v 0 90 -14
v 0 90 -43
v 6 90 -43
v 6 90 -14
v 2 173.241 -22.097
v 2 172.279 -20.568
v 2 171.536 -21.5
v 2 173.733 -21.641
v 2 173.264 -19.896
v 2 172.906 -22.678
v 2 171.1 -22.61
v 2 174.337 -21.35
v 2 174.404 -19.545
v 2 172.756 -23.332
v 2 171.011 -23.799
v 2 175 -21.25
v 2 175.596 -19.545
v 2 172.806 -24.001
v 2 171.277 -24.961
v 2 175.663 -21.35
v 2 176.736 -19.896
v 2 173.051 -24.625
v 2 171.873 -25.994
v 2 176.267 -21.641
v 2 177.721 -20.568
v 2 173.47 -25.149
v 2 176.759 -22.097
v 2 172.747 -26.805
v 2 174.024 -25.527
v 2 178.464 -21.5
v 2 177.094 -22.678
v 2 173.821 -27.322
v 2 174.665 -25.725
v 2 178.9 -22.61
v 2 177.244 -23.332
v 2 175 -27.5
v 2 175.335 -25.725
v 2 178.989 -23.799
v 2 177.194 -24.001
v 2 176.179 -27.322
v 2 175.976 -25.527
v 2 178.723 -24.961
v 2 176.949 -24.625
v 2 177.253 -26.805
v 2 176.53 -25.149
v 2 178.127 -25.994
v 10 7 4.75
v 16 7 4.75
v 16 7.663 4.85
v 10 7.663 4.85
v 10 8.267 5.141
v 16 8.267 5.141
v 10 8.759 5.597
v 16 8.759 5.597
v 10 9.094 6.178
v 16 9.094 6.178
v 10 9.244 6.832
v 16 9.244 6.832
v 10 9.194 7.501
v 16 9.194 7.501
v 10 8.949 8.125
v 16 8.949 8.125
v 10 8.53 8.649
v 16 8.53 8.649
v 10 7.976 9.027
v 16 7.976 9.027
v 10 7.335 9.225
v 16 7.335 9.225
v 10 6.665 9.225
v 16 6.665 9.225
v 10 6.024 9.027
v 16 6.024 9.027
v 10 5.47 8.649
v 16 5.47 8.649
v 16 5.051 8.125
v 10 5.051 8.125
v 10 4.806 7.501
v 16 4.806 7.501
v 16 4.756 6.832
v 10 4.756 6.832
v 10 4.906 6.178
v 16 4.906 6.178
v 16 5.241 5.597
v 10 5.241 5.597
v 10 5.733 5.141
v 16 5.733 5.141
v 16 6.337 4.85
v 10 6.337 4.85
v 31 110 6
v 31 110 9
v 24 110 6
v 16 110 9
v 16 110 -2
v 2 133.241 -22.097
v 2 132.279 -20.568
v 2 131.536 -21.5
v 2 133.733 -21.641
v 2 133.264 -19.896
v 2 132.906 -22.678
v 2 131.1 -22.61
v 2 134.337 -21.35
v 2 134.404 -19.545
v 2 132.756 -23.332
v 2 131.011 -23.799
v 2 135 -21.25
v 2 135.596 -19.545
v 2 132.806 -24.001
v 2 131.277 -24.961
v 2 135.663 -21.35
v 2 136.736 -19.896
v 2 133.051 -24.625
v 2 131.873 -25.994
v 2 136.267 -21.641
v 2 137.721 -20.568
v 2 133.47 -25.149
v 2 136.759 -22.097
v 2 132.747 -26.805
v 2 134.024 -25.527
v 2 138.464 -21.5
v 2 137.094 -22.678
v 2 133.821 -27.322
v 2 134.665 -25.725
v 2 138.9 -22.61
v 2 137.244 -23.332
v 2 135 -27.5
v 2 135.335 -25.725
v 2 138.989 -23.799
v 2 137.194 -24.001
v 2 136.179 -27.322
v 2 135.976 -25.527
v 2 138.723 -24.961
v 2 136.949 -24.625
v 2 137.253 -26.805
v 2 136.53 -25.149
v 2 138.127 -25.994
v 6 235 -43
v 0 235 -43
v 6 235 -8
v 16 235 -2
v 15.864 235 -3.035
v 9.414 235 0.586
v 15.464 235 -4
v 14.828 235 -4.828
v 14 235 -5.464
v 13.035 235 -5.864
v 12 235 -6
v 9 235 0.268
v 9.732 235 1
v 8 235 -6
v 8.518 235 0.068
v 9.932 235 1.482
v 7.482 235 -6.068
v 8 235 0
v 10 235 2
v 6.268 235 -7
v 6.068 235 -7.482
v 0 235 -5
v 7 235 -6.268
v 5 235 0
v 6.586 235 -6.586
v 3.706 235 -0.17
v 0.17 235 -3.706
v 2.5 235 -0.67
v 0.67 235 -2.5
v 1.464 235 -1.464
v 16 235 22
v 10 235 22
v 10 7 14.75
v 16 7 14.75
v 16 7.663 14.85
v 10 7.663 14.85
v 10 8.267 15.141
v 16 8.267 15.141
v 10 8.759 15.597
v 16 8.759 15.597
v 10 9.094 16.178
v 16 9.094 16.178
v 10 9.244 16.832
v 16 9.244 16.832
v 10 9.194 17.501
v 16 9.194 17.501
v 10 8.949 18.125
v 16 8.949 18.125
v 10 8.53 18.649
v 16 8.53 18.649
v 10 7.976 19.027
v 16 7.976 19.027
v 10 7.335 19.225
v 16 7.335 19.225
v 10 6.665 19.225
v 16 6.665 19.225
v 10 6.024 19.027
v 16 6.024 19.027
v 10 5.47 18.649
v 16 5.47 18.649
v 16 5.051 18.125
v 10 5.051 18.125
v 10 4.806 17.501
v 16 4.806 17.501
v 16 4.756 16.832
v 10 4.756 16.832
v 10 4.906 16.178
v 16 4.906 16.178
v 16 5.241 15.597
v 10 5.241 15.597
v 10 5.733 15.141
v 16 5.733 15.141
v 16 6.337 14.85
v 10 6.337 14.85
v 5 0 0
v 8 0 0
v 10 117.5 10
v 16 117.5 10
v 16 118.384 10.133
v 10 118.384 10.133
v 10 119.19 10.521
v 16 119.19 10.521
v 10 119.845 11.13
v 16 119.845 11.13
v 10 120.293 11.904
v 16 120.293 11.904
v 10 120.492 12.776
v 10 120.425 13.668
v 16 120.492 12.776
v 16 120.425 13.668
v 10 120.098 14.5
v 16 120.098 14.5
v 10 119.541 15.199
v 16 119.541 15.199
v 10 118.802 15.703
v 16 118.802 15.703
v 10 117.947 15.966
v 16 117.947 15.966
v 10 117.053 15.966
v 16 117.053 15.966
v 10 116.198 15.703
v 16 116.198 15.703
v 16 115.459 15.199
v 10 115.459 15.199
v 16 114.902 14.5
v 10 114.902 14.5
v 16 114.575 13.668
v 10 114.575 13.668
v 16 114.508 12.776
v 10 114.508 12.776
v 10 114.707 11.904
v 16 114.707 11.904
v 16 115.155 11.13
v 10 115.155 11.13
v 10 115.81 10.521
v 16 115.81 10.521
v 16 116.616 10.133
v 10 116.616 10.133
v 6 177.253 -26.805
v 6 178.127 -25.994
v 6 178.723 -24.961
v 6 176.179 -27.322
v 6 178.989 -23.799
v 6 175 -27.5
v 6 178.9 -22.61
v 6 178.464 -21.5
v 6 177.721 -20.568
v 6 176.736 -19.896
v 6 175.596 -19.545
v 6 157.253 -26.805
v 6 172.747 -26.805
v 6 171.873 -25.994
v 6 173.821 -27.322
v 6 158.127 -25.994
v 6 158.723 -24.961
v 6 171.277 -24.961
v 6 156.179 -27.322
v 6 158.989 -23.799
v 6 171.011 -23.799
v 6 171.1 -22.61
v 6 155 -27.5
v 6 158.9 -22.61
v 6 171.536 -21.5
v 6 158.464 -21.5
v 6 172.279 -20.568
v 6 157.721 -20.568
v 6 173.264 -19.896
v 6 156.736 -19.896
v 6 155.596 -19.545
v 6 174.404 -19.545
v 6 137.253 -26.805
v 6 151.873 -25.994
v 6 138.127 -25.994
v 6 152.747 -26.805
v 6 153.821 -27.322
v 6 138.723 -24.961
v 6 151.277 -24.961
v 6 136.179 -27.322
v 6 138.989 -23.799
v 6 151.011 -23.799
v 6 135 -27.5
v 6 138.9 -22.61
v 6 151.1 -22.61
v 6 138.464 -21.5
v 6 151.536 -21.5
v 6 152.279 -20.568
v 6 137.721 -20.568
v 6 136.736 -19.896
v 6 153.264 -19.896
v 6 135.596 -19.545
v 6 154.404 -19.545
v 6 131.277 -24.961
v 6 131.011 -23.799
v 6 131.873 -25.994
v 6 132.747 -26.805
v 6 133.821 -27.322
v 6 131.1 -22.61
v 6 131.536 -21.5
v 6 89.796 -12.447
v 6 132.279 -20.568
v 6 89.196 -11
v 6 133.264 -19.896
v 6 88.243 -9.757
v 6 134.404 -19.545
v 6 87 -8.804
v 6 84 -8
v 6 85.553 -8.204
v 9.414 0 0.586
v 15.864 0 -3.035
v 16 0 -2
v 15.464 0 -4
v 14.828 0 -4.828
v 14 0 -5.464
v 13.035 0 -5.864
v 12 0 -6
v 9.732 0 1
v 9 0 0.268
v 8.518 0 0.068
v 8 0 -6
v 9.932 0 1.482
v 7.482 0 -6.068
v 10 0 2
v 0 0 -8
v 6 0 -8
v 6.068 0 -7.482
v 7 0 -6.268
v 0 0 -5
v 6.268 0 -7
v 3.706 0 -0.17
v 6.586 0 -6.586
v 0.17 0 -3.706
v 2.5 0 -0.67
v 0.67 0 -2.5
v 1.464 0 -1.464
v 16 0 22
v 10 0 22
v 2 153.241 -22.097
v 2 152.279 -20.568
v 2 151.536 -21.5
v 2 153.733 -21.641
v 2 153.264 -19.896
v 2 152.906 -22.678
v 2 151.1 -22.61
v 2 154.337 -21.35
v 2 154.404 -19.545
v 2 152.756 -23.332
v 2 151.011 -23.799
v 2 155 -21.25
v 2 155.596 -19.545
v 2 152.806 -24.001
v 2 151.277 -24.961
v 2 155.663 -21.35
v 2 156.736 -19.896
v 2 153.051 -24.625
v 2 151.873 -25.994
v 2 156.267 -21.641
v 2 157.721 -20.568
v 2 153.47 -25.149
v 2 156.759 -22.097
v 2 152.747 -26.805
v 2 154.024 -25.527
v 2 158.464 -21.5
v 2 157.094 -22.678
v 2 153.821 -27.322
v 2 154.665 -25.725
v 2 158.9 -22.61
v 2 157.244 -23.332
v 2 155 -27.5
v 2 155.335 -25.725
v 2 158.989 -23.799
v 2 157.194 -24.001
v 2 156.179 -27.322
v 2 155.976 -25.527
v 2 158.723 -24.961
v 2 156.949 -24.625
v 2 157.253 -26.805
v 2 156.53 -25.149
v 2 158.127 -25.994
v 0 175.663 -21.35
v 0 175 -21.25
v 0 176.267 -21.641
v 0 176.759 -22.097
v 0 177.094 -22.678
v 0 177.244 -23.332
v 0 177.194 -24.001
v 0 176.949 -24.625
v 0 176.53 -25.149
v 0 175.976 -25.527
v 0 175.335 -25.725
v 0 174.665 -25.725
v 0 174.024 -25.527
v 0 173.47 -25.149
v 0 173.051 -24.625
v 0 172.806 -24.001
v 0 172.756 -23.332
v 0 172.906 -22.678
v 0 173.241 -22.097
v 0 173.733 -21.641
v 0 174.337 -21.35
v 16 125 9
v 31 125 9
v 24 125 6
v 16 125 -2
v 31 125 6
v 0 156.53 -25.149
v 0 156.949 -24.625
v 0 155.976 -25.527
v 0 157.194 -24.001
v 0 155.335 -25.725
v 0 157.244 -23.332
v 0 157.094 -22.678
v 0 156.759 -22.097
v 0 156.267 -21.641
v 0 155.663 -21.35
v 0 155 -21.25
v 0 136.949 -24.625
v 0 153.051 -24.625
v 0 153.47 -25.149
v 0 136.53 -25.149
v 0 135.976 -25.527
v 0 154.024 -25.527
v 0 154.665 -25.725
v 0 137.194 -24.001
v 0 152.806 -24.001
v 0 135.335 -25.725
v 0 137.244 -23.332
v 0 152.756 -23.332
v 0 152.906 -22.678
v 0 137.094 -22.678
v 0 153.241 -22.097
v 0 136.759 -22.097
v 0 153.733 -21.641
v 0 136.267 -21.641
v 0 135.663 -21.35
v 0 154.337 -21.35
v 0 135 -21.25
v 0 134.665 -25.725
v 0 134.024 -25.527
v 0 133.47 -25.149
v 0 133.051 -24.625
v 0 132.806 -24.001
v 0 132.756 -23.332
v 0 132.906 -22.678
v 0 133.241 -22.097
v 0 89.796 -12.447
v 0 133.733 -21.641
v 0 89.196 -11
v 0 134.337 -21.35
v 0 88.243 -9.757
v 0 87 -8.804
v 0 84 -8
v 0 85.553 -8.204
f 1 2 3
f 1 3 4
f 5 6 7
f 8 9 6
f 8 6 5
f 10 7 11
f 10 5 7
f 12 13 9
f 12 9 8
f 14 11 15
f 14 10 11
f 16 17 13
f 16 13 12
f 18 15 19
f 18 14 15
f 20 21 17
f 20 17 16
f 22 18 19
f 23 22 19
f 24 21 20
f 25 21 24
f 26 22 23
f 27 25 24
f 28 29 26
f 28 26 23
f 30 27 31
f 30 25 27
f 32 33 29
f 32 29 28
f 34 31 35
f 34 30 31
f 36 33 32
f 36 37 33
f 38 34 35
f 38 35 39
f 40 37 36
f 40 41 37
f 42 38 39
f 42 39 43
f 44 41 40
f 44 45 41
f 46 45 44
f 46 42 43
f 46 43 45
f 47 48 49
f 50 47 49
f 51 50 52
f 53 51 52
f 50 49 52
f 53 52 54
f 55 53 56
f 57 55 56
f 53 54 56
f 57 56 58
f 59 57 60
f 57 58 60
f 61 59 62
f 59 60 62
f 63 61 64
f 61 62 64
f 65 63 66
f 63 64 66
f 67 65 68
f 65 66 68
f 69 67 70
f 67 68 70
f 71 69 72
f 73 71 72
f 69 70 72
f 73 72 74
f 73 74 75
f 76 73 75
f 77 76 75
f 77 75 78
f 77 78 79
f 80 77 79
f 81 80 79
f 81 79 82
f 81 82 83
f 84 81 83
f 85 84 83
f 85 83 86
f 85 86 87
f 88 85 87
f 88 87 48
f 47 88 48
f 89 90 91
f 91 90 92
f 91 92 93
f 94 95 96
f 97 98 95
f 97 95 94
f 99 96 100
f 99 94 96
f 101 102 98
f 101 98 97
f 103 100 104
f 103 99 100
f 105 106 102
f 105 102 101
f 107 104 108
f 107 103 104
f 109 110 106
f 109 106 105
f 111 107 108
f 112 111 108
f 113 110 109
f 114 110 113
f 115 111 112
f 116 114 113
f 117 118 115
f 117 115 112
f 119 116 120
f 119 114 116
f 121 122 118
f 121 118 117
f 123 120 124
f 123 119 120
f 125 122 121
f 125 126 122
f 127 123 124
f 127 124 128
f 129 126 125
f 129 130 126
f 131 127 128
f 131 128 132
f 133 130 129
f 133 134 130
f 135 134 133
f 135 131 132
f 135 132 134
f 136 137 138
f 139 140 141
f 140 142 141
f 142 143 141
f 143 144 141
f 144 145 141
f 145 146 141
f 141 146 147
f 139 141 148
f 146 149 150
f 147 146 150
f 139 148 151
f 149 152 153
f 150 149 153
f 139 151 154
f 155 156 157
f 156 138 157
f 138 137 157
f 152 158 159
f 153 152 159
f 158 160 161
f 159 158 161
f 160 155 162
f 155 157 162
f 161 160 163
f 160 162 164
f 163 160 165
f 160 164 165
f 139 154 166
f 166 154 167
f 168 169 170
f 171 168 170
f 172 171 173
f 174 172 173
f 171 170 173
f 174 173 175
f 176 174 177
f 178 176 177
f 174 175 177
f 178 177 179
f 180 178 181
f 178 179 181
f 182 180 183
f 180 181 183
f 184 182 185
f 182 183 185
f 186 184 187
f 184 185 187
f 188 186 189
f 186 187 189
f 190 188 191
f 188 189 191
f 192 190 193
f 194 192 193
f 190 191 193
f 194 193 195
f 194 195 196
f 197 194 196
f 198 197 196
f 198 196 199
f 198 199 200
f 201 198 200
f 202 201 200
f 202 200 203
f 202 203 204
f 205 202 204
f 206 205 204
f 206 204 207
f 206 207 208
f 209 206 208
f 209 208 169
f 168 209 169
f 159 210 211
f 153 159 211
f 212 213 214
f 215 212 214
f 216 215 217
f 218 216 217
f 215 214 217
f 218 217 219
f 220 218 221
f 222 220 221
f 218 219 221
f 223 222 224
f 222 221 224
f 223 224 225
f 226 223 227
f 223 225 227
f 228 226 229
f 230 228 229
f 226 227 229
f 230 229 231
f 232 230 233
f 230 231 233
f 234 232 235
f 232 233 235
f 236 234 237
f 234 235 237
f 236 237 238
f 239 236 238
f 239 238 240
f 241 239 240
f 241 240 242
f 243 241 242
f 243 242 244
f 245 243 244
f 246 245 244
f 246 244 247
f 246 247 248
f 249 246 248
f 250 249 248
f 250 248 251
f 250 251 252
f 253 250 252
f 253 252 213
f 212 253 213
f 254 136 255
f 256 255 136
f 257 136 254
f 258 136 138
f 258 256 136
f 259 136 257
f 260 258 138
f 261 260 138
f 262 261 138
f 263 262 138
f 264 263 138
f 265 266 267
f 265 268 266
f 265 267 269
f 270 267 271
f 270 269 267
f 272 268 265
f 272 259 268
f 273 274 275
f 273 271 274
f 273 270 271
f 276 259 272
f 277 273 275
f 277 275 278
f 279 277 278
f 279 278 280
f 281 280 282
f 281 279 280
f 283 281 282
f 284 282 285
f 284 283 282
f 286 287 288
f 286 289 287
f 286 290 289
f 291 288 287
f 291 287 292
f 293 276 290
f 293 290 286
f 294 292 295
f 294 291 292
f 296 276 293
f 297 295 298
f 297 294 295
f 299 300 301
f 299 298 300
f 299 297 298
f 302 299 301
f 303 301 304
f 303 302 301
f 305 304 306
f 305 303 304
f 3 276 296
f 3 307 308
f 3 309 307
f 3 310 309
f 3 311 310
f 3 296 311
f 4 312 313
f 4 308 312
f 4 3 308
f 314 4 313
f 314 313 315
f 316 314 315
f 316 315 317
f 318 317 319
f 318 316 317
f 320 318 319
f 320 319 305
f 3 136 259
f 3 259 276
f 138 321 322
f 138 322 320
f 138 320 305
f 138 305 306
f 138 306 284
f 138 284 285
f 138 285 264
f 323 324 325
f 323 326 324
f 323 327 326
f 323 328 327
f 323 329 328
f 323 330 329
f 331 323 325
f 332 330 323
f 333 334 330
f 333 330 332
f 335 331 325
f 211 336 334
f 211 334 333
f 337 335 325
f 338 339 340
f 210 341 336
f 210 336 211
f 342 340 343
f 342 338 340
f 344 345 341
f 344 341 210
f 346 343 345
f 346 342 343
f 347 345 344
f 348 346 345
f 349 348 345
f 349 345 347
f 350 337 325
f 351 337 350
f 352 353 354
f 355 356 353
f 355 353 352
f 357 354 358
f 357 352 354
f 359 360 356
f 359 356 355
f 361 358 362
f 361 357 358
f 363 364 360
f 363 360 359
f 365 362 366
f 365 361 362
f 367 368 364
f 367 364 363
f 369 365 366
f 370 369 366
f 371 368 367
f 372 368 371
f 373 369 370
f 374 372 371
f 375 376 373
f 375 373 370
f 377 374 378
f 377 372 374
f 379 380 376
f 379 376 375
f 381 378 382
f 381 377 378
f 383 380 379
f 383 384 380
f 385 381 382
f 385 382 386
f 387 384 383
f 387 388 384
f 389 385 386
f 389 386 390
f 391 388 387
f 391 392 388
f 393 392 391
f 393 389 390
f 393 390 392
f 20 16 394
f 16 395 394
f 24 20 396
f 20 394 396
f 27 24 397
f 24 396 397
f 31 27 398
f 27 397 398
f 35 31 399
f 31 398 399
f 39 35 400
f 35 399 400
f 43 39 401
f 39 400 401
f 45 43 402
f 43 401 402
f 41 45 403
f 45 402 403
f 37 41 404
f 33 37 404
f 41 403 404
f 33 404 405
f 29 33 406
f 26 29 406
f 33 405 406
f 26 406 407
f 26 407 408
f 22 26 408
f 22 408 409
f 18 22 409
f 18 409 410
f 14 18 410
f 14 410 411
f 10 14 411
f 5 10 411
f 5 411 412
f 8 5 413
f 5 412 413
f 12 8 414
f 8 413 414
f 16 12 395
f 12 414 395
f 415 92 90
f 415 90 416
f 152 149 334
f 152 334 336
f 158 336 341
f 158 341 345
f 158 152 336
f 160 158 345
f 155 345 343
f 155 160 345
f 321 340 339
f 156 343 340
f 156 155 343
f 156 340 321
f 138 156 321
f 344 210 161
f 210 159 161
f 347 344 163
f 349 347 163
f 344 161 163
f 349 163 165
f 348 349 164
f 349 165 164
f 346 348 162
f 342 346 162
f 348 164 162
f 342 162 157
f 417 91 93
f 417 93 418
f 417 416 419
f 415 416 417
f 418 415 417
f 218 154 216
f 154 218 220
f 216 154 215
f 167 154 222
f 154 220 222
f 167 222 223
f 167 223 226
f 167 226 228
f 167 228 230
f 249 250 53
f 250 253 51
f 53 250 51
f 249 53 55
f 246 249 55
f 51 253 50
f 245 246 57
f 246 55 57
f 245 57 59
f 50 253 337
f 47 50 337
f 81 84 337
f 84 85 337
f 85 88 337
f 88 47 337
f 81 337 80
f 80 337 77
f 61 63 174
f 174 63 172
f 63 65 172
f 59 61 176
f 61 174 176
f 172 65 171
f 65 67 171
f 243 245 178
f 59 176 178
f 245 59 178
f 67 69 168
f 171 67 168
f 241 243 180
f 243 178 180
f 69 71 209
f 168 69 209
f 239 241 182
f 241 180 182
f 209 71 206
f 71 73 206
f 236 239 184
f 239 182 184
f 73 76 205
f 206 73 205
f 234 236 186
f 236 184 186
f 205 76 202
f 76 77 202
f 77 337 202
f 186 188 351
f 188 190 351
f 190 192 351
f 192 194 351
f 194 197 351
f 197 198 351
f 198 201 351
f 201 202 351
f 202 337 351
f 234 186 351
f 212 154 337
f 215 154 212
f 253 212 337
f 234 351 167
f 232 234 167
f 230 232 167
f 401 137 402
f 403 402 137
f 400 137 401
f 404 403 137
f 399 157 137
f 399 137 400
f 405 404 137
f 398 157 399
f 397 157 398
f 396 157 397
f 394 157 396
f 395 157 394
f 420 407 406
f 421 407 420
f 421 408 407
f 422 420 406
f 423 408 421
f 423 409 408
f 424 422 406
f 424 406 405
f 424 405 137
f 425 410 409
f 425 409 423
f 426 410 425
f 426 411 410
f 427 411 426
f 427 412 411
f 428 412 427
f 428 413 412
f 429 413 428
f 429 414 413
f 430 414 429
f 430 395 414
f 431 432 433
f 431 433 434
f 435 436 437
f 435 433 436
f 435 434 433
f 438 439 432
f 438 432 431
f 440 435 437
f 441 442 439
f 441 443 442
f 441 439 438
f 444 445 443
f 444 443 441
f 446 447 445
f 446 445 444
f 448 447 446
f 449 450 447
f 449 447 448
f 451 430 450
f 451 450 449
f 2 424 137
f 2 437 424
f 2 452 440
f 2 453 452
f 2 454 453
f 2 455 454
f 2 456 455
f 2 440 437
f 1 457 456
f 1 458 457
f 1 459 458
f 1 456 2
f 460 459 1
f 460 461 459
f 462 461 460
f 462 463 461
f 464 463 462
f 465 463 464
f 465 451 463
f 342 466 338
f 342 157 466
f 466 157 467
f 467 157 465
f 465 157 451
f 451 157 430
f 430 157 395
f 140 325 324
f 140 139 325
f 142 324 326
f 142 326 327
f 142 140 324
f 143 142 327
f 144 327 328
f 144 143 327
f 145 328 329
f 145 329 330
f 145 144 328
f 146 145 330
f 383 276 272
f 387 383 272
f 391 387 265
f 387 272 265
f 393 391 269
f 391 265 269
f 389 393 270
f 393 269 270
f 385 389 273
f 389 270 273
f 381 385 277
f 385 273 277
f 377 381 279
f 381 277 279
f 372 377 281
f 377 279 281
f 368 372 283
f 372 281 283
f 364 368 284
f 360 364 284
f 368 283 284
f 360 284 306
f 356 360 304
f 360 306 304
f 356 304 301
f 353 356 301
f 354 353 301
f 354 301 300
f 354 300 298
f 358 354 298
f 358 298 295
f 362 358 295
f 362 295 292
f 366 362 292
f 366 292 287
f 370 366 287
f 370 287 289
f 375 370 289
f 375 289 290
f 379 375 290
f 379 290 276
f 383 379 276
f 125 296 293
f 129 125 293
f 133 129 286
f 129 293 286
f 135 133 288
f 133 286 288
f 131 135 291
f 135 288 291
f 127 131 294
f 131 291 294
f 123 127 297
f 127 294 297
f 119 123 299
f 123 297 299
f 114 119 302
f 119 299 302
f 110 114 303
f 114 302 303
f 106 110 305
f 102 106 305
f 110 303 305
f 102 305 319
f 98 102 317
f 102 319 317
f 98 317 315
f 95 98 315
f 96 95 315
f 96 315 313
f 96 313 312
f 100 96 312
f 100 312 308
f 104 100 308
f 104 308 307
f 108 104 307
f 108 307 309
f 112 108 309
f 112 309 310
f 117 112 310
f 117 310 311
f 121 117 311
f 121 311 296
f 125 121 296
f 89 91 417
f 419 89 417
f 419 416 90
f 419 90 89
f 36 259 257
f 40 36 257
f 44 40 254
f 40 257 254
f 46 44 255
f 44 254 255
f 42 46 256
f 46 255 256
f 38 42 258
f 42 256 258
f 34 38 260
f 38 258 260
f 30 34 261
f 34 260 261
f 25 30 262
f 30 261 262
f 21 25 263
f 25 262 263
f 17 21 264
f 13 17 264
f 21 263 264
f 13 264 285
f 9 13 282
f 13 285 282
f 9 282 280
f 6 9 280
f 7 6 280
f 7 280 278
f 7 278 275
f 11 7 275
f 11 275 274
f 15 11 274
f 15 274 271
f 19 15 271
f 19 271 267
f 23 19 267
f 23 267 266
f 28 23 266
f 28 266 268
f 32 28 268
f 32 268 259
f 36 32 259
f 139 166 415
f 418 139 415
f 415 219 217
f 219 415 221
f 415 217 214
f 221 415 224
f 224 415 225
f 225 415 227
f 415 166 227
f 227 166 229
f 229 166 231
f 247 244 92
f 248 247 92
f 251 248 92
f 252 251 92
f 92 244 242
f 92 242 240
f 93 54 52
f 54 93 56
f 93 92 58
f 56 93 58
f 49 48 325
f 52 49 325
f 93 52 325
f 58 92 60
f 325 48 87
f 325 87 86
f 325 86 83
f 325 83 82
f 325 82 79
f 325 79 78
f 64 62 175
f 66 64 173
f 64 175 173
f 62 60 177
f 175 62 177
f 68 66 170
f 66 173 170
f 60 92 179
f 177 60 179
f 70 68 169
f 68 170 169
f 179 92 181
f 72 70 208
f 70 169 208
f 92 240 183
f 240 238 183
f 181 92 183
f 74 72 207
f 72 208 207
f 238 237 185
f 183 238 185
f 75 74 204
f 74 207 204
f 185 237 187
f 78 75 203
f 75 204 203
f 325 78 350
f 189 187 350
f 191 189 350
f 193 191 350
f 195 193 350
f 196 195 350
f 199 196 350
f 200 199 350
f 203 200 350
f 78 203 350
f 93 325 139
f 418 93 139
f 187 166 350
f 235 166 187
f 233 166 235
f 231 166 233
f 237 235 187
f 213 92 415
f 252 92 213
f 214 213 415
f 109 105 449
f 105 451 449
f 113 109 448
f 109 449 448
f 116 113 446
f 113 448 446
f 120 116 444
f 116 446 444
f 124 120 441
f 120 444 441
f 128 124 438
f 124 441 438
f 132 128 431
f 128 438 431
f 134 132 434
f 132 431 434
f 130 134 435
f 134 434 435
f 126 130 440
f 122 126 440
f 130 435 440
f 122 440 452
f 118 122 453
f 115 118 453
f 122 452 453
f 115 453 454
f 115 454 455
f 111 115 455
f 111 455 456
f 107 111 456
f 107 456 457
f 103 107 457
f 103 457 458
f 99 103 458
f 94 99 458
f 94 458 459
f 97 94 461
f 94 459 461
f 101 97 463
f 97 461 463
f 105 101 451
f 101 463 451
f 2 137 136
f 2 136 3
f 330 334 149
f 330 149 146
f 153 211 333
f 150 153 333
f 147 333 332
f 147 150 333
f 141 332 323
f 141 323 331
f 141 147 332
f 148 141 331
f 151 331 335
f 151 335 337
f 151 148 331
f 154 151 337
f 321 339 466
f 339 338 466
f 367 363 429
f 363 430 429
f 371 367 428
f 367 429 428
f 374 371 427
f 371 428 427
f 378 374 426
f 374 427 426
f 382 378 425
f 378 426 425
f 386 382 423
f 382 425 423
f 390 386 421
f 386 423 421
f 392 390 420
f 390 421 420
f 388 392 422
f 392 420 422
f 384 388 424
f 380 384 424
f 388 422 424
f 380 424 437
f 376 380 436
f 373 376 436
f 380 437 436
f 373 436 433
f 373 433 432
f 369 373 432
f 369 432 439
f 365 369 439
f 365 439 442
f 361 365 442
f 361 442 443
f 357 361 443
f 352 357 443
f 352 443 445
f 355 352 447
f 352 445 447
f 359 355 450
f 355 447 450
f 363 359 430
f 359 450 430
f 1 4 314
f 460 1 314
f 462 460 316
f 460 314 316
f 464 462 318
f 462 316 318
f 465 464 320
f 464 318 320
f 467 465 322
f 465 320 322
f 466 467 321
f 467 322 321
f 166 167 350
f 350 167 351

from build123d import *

# Parameters (mm, degrees)
SCHIZZO1_W                                           = 235
SCHIZZO1_H                                           = 65
ESTRUSIONE_ESTRUSIONE1_DEPTH                         = 16
SCHIZZO2_W                                           = 10
SCHIZZO2_H                                           = 37
TAGLIO_ESTRUSIONE1_DEPTH                             = 240.436839271
SCHIZZO3_W                                           = 35
SCHIZZO3_H                                           = 90
TAGLIO_ESTRUSIONE2_DEPTH                             = 240.436839271
SCHIZZO4_W                                           = 10
SCHIZZO4_H                                           = 22
TAGLIO_ESTRUSIONE3_DEPTH                             = 240.436839271
FORO_LAMATO_PER_VITE_M4_A_TESTA_ESAGONAL_D           = 4.5
FORO_LAMATO_PER_VITE_M4_A_TESTA_ESAGONAL_CBORE_D     = 8
FORO_LAMATO_PER_VITE_M4_A_TESTA_ESAGONAL_CBORE_DEPTH = 4
RACCORDO1_R                                          = 2
RACCORDO2_R                                          = 4
RACCORDO3_R                                          = 5
RACCORDO4_R                                          = 6
FORO_PER_VITE_M4_1_D                                 = 4.5
FORO_PER_VITE_M4_1_DEPTH                             = 188
FORO_PER_VITE_M4_1_TIP                               = 1.351936393
SCHIZZO9_W                                           = 3
SCHIZZO9_H                                           = 15
ESTRUSIONE_ESTRUSIONE2_DEPTH                         = 15
SCHIZZO10_R                                          = 3
TAGLIO_ESTRUSIONE4_DEPTH                             = 15
SMUSSO1_SIZE                                         = 8


with BuildPart() as part:
    # Schizzo1 → Estrusione-Estrusione1 (new body)
    with BuildSketch(Plane(origin=(0, 0, 0), x_dir=(0, -1, 0), z_dir=(-1, 0, 0))):
        with Locations((-117.5, -10.5)):
            Rectangle(SCHIZZO1_W, SCHIZZO1_H)
    extrude(amount=-ESTRUSIONE_ESTRUSIONE1_DEPTH)

    # Schizzo2 → Taglio-Estrusione1 (cut, through all)
    with BuildSketch(Plane.XZ):
        with Locations((11, -24.5)):
            Rectangle(SCHIZZO2_W, SCHIZZO2_H)
    extrude(amount=-TAGLIO_ESTRUSIONE1_DEPTH, mode=Mode.SUBTRACT)

    # Schizzo3 → Taglio-Estrusione2 (cut, through all)
    with BuildSketch(Plane.ZY):
        with Locations((-25.5, 45)):
            Rectangle(SCHIZZO3_W, SCHIZZO3_H)
    extrude(amount=-TAGLIO_ESTRUSIONE2_DEPTH, mode=Mode.SUBTRACT)

    # Schizzo4 → Taglio-Estrusione3 (cut, through all)
    with BuildSketch(Plane.XZ):
        with Locations((5, 11)):
            Rectangle(SCHIZZO4_W, SCHIZZO4_H)
    extrude(amount=-TAGLIO_ESTRUSIONE3_DEPTH, mode=Mode.SUBTRACT)

    # Foro lamato per Vite M4 a testa esagonale-1 (through all)
    with Locations(Plane(origin=(6, 0, 0), x_dir=(0, 0, -1), z_dir=(1, 0, 0))):
        with Locations((23.5, 175), (23.5, 155), (23.5, 135)):
            CounterBoreHole(FORO_LAMATO_PER_VITE_M4_A_TESTA_ESAGONAL_D / 2, FORO_LAMATO_PER_VITE_M4_A_TESTA_ESAGONAL_CBORE_D / 2, FORO_LAMATO_PER_VITE_M4_A_TESTA_ESAGONAL_CBORE_DEPTH)

    # Raccordo1
    raccordo1_edges = [part.edges().sort_by_distance(p)[0] for p in [
        (10, 117.5, 0),
        (6, 117.5, -6),
    ]]
    fillet(raccordo1_edges, radius=RACCORDO1_R)

    # Raccordo2
    raccordo2_edges = [part.edges().sort_by_distance(p)[0] for p in [
        (16, 117.5, -6),
    ]]
    fillet(raccordo2_edges, radius=RACCORDO2_R)

    # Raccordo3
    raccordo3_edges = [part.edges().sort_by_distance(p)[0] for p in [
        (0, 117.5, 0),
    ]]
    fillet(raccordo3_edges, radius=RACCORDO3_R)

    # Raccordo4
    raccordo4_edges = [part.edges().sort_by_distance(p)[0] for p in [
        (3, 90, -8),
    ]]
    fillet(raccordo4_edges, radius=RACCORDO4_R)

    # Foro per Vite M4-1
    with Locations(Plane.ZY.offset(-10)):
        with Locations((17, 7), (7, 7)):
            Hole(FORO_PER_VITE_M4_1_D / 2, depth=FORO_PER_VITE_M4_1_DEPTH)
            with Locations((0, 0, -(FORO_PER_VITE_M4_1_DEPTH + FORO_PER_VITE_M4_1_TIP / 2))):  # 118° drill point
                Cone(0, FORO_PER_VITE_M4_1_D / 2, FORO_PER_VITE_M4_1_TIP, mode=Mode.SUBTRACT)

    # Schizzo9 → Estrusione-Estrusione2 (add)
    with BuildSketch(Plane(origin=(16, 0, 0), x_dir=(0, 0, -1), z_dir=(1, 0, 0))):
        with Locations((-7.5, 117.5)):
            Rectangle(SCHIZZO9_W, SCHIZZO9_H)
    extrude(amount=ESTRUSIONE_ESTRUSIONE2_DEPTH)

    # Schizzo10 → Taglio-Estrusione4 (cut)
    with BuildSketch(Plane(origin=(16, 0, 0), x_dir=(0, 0, -1), z_dir=(1, 0, 0))):
        with Locations((-13, 117.5)):
            Circle(SCHIZZO10_R)
    extrude(amount=-TAGLIO_ESTRUSIONE4_DEPTH, mode=Mode.SUBTRACT)

    # Smusso1
    smusso1_edges = [part.edges().sort_by_distance(p)[0] for p in [
        (16, 117.5, 6),
    ]]
    chamfer(smusso1_edges, length=SMUSSO1_SIZE - 0.0001)  # a hair under: the kernel refuses the full size


solid = part.part
